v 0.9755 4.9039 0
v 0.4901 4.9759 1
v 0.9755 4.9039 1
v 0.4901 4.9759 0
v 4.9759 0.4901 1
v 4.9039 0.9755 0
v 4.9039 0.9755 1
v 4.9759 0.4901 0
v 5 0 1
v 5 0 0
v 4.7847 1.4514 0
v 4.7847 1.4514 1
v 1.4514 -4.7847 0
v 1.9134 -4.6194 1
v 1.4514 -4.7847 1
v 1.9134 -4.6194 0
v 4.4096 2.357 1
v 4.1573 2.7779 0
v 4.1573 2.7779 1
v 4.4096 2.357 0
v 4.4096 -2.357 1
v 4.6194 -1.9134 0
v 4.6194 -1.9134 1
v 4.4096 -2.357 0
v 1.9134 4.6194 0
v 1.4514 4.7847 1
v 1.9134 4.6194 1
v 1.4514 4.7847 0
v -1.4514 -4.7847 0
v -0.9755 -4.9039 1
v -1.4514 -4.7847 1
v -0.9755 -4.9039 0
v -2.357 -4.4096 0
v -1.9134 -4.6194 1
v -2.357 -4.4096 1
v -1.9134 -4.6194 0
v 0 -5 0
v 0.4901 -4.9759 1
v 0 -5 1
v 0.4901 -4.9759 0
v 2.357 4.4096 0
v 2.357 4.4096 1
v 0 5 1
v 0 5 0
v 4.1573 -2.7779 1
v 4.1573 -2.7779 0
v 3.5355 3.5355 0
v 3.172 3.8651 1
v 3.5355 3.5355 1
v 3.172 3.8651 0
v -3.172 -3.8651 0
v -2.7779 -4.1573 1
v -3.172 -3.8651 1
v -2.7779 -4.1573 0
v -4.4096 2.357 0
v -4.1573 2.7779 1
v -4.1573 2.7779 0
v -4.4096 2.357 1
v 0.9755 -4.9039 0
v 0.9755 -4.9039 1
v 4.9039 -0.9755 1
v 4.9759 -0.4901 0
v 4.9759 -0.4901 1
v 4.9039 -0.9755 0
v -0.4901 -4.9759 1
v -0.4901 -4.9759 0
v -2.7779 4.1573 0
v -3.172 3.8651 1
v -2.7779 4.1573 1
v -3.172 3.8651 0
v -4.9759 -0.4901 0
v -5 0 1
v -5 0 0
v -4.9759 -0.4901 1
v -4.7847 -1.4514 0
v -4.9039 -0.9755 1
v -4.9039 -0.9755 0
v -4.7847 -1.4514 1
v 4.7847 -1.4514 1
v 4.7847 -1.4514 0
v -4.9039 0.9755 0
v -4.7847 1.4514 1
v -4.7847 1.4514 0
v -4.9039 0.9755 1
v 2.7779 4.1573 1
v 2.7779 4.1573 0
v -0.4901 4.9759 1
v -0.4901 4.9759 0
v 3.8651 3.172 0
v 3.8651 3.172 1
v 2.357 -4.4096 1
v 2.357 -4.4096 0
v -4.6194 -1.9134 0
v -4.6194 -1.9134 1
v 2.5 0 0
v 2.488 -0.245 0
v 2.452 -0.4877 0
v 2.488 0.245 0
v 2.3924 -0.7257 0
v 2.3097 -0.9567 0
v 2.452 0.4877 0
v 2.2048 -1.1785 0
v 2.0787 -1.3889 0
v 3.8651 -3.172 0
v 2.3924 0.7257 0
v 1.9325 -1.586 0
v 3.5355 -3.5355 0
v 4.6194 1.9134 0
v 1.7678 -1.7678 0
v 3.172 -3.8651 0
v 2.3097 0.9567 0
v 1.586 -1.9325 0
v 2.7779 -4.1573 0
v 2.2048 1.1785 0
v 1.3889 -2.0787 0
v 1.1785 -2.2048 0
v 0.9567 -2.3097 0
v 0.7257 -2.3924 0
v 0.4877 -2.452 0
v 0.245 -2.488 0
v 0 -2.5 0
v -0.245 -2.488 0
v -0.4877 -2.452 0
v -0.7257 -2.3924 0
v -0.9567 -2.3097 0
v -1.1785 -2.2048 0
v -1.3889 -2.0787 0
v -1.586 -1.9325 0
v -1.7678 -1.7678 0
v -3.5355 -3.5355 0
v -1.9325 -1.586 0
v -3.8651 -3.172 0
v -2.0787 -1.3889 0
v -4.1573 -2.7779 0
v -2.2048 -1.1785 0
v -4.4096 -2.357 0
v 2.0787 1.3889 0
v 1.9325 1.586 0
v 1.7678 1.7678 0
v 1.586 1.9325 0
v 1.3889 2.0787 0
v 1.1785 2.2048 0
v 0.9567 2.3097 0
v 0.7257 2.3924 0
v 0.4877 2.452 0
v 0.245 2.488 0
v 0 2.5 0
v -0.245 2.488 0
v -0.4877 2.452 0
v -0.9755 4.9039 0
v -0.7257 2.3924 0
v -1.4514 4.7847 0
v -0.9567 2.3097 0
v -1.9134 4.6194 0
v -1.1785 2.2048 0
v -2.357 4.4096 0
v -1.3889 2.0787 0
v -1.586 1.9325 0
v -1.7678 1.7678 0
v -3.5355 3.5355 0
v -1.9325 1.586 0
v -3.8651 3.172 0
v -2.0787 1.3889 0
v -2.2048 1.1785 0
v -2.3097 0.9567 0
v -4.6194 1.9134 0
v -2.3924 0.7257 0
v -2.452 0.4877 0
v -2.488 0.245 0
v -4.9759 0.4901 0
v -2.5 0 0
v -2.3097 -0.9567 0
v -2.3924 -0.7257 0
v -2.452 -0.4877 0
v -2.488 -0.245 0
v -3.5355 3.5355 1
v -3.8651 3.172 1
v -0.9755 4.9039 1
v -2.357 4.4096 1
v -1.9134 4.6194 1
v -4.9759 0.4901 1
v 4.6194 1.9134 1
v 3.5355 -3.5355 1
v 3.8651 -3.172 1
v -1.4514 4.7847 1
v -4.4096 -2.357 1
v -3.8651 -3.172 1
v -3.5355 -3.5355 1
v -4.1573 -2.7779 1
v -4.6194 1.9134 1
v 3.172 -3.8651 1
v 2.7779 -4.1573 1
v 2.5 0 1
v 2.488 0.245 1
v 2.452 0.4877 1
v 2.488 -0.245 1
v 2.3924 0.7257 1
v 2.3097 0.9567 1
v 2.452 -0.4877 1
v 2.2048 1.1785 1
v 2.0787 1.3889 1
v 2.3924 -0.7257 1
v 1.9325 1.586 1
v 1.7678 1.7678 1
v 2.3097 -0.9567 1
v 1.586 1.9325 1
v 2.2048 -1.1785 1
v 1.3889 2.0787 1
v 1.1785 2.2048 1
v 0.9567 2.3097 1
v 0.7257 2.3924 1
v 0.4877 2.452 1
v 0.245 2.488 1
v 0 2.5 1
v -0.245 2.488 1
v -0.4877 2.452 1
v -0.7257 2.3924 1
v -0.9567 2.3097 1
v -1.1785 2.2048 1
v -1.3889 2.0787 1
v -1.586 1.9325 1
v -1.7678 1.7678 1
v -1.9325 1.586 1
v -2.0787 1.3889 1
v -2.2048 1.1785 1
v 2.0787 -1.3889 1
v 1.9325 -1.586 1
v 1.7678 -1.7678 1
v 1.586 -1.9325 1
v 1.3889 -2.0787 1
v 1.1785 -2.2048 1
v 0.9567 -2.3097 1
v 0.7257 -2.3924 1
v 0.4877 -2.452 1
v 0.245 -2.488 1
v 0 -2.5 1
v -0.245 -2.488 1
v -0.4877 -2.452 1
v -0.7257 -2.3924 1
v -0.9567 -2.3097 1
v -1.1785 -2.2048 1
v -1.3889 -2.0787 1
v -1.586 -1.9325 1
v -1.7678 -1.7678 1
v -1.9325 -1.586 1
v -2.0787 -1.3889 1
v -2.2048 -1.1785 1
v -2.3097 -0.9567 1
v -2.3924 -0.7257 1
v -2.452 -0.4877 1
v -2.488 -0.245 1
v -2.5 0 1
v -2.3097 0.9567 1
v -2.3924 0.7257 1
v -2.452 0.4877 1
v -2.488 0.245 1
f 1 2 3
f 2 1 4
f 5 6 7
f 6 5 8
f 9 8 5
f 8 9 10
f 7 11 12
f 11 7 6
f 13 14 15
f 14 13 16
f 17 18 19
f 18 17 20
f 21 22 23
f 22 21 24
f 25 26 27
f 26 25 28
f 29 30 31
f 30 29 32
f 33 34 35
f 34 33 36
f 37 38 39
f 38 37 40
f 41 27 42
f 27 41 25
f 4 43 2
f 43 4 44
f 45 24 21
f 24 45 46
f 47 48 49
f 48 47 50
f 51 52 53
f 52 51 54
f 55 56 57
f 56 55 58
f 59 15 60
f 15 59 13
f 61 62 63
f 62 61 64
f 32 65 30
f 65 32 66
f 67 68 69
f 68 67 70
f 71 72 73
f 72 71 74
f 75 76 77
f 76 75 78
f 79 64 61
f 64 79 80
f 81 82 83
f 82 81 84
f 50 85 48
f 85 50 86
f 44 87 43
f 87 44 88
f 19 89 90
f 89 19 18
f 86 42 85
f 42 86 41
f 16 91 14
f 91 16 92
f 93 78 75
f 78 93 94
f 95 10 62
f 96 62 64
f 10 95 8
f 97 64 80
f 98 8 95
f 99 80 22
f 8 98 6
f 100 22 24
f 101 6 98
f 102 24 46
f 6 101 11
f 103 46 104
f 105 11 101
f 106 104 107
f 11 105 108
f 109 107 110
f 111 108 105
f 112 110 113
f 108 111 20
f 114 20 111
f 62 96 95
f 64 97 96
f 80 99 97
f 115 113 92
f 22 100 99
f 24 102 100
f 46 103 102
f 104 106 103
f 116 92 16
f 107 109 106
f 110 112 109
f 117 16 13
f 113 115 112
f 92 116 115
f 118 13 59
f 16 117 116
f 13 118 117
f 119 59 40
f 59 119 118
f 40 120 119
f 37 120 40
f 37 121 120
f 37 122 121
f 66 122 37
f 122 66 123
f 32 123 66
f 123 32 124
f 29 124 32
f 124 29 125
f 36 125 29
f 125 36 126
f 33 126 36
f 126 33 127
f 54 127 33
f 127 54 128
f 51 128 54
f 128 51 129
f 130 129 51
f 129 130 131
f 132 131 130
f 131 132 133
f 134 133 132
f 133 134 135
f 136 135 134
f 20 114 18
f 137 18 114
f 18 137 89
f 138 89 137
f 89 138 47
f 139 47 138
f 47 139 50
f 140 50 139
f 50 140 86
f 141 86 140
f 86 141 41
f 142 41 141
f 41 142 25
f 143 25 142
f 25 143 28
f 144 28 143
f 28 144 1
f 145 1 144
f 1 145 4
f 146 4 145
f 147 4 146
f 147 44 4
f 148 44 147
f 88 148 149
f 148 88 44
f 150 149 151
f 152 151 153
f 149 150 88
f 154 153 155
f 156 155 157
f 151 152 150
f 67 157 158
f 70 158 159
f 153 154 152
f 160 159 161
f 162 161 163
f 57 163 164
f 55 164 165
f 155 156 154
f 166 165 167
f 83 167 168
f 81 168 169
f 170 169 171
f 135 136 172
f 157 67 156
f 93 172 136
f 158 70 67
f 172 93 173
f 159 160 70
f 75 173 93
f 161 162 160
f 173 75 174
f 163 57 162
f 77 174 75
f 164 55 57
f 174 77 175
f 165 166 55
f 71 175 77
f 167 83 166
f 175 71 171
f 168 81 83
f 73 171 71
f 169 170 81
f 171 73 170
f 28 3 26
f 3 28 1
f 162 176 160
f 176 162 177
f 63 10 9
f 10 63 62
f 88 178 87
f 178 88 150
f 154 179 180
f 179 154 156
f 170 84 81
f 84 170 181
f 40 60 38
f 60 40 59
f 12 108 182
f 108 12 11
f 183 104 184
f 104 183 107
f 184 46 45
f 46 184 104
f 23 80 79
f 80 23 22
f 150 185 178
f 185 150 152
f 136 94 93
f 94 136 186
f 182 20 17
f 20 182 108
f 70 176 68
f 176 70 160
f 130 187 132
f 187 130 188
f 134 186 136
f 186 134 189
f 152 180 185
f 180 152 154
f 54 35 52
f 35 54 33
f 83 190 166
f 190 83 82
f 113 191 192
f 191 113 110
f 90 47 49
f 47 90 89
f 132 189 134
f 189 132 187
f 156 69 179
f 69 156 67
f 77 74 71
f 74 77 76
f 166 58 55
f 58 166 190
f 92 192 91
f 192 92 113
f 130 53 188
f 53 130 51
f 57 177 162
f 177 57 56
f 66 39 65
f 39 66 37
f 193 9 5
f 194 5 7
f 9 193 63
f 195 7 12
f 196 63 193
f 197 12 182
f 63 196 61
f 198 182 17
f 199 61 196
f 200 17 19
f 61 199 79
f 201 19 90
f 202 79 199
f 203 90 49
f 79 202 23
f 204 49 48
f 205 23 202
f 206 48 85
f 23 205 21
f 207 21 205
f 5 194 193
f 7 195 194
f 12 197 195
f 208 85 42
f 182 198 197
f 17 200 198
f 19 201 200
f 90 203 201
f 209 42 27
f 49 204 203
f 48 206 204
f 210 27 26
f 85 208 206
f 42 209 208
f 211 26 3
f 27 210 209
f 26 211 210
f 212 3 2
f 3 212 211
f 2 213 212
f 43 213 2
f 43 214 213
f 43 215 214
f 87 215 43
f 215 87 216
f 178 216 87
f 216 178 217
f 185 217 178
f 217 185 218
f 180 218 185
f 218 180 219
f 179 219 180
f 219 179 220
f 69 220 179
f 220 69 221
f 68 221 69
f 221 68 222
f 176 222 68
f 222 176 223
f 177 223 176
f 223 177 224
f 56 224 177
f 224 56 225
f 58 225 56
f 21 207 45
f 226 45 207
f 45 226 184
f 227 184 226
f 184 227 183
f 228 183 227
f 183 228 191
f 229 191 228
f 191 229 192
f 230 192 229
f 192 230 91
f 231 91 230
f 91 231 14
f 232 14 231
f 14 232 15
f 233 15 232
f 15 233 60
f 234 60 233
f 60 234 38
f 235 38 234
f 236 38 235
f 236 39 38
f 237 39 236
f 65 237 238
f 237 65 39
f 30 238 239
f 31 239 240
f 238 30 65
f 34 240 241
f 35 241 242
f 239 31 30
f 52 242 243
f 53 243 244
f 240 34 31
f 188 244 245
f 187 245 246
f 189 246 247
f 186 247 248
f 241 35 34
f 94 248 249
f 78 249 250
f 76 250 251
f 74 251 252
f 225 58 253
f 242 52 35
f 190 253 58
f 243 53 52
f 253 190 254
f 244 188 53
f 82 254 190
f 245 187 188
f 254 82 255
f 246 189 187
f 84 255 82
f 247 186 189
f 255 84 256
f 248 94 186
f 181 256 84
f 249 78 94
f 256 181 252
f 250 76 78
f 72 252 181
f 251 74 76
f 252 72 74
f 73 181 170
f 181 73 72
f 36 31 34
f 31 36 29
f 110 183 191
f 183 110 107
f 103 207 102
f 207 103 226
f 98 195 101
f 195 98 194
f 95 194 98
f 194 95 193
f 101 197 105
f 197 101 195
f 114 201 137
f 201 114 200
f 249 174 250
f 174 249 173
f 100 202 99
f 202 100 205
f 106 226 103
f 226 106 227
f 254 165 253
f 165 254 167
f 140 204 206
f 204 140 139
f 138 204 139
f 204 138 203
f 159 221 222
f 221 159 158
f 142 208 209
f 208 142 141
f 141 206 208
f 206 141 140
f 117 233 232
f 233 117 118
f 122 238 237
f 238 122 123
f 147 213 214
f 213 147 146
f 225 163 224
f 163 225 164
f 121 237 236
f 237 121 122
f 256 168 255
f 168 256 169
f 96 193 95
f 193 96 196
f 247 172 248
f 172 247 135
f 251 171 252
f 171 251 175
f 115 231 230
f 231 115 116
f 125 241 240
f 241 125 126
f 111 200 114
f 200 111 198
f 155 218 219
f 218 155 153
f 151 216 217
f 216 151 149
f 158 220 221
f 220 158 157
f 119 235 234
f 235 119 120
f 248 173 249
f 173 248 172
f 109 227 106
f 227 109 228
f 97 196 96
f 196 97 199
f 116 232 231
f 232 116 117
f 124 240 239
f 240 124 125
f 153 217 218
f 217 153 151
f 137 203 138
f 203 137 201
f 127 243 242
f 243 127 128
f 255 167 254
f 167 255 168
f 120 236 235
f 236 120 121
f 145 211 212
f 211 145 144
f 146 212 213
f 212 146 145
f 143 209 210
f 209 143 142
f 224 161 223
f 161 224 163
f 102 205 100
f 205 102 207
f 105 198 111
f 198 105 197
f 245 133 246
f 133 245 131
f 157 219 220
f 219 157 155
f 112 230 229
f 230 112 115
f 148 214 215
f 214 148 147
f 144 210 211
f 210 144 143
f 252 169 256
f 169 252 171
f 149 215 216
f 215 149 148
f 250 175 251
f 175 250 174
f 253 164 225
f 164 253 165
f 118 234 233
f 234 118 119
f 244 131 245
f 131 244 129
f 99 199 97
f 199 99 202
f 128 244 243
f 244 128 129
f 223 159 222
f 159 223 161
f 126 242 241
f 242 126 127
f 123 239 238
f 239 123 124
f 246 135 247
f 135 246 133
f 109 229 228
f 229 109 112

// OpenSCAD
difference() {
    cylinder(h=1.0, d=10.0, $fn=64);
    translate([0, 0, -0.5])
        cylinder(h=2.0, d=5.0, $fn=64);
}
